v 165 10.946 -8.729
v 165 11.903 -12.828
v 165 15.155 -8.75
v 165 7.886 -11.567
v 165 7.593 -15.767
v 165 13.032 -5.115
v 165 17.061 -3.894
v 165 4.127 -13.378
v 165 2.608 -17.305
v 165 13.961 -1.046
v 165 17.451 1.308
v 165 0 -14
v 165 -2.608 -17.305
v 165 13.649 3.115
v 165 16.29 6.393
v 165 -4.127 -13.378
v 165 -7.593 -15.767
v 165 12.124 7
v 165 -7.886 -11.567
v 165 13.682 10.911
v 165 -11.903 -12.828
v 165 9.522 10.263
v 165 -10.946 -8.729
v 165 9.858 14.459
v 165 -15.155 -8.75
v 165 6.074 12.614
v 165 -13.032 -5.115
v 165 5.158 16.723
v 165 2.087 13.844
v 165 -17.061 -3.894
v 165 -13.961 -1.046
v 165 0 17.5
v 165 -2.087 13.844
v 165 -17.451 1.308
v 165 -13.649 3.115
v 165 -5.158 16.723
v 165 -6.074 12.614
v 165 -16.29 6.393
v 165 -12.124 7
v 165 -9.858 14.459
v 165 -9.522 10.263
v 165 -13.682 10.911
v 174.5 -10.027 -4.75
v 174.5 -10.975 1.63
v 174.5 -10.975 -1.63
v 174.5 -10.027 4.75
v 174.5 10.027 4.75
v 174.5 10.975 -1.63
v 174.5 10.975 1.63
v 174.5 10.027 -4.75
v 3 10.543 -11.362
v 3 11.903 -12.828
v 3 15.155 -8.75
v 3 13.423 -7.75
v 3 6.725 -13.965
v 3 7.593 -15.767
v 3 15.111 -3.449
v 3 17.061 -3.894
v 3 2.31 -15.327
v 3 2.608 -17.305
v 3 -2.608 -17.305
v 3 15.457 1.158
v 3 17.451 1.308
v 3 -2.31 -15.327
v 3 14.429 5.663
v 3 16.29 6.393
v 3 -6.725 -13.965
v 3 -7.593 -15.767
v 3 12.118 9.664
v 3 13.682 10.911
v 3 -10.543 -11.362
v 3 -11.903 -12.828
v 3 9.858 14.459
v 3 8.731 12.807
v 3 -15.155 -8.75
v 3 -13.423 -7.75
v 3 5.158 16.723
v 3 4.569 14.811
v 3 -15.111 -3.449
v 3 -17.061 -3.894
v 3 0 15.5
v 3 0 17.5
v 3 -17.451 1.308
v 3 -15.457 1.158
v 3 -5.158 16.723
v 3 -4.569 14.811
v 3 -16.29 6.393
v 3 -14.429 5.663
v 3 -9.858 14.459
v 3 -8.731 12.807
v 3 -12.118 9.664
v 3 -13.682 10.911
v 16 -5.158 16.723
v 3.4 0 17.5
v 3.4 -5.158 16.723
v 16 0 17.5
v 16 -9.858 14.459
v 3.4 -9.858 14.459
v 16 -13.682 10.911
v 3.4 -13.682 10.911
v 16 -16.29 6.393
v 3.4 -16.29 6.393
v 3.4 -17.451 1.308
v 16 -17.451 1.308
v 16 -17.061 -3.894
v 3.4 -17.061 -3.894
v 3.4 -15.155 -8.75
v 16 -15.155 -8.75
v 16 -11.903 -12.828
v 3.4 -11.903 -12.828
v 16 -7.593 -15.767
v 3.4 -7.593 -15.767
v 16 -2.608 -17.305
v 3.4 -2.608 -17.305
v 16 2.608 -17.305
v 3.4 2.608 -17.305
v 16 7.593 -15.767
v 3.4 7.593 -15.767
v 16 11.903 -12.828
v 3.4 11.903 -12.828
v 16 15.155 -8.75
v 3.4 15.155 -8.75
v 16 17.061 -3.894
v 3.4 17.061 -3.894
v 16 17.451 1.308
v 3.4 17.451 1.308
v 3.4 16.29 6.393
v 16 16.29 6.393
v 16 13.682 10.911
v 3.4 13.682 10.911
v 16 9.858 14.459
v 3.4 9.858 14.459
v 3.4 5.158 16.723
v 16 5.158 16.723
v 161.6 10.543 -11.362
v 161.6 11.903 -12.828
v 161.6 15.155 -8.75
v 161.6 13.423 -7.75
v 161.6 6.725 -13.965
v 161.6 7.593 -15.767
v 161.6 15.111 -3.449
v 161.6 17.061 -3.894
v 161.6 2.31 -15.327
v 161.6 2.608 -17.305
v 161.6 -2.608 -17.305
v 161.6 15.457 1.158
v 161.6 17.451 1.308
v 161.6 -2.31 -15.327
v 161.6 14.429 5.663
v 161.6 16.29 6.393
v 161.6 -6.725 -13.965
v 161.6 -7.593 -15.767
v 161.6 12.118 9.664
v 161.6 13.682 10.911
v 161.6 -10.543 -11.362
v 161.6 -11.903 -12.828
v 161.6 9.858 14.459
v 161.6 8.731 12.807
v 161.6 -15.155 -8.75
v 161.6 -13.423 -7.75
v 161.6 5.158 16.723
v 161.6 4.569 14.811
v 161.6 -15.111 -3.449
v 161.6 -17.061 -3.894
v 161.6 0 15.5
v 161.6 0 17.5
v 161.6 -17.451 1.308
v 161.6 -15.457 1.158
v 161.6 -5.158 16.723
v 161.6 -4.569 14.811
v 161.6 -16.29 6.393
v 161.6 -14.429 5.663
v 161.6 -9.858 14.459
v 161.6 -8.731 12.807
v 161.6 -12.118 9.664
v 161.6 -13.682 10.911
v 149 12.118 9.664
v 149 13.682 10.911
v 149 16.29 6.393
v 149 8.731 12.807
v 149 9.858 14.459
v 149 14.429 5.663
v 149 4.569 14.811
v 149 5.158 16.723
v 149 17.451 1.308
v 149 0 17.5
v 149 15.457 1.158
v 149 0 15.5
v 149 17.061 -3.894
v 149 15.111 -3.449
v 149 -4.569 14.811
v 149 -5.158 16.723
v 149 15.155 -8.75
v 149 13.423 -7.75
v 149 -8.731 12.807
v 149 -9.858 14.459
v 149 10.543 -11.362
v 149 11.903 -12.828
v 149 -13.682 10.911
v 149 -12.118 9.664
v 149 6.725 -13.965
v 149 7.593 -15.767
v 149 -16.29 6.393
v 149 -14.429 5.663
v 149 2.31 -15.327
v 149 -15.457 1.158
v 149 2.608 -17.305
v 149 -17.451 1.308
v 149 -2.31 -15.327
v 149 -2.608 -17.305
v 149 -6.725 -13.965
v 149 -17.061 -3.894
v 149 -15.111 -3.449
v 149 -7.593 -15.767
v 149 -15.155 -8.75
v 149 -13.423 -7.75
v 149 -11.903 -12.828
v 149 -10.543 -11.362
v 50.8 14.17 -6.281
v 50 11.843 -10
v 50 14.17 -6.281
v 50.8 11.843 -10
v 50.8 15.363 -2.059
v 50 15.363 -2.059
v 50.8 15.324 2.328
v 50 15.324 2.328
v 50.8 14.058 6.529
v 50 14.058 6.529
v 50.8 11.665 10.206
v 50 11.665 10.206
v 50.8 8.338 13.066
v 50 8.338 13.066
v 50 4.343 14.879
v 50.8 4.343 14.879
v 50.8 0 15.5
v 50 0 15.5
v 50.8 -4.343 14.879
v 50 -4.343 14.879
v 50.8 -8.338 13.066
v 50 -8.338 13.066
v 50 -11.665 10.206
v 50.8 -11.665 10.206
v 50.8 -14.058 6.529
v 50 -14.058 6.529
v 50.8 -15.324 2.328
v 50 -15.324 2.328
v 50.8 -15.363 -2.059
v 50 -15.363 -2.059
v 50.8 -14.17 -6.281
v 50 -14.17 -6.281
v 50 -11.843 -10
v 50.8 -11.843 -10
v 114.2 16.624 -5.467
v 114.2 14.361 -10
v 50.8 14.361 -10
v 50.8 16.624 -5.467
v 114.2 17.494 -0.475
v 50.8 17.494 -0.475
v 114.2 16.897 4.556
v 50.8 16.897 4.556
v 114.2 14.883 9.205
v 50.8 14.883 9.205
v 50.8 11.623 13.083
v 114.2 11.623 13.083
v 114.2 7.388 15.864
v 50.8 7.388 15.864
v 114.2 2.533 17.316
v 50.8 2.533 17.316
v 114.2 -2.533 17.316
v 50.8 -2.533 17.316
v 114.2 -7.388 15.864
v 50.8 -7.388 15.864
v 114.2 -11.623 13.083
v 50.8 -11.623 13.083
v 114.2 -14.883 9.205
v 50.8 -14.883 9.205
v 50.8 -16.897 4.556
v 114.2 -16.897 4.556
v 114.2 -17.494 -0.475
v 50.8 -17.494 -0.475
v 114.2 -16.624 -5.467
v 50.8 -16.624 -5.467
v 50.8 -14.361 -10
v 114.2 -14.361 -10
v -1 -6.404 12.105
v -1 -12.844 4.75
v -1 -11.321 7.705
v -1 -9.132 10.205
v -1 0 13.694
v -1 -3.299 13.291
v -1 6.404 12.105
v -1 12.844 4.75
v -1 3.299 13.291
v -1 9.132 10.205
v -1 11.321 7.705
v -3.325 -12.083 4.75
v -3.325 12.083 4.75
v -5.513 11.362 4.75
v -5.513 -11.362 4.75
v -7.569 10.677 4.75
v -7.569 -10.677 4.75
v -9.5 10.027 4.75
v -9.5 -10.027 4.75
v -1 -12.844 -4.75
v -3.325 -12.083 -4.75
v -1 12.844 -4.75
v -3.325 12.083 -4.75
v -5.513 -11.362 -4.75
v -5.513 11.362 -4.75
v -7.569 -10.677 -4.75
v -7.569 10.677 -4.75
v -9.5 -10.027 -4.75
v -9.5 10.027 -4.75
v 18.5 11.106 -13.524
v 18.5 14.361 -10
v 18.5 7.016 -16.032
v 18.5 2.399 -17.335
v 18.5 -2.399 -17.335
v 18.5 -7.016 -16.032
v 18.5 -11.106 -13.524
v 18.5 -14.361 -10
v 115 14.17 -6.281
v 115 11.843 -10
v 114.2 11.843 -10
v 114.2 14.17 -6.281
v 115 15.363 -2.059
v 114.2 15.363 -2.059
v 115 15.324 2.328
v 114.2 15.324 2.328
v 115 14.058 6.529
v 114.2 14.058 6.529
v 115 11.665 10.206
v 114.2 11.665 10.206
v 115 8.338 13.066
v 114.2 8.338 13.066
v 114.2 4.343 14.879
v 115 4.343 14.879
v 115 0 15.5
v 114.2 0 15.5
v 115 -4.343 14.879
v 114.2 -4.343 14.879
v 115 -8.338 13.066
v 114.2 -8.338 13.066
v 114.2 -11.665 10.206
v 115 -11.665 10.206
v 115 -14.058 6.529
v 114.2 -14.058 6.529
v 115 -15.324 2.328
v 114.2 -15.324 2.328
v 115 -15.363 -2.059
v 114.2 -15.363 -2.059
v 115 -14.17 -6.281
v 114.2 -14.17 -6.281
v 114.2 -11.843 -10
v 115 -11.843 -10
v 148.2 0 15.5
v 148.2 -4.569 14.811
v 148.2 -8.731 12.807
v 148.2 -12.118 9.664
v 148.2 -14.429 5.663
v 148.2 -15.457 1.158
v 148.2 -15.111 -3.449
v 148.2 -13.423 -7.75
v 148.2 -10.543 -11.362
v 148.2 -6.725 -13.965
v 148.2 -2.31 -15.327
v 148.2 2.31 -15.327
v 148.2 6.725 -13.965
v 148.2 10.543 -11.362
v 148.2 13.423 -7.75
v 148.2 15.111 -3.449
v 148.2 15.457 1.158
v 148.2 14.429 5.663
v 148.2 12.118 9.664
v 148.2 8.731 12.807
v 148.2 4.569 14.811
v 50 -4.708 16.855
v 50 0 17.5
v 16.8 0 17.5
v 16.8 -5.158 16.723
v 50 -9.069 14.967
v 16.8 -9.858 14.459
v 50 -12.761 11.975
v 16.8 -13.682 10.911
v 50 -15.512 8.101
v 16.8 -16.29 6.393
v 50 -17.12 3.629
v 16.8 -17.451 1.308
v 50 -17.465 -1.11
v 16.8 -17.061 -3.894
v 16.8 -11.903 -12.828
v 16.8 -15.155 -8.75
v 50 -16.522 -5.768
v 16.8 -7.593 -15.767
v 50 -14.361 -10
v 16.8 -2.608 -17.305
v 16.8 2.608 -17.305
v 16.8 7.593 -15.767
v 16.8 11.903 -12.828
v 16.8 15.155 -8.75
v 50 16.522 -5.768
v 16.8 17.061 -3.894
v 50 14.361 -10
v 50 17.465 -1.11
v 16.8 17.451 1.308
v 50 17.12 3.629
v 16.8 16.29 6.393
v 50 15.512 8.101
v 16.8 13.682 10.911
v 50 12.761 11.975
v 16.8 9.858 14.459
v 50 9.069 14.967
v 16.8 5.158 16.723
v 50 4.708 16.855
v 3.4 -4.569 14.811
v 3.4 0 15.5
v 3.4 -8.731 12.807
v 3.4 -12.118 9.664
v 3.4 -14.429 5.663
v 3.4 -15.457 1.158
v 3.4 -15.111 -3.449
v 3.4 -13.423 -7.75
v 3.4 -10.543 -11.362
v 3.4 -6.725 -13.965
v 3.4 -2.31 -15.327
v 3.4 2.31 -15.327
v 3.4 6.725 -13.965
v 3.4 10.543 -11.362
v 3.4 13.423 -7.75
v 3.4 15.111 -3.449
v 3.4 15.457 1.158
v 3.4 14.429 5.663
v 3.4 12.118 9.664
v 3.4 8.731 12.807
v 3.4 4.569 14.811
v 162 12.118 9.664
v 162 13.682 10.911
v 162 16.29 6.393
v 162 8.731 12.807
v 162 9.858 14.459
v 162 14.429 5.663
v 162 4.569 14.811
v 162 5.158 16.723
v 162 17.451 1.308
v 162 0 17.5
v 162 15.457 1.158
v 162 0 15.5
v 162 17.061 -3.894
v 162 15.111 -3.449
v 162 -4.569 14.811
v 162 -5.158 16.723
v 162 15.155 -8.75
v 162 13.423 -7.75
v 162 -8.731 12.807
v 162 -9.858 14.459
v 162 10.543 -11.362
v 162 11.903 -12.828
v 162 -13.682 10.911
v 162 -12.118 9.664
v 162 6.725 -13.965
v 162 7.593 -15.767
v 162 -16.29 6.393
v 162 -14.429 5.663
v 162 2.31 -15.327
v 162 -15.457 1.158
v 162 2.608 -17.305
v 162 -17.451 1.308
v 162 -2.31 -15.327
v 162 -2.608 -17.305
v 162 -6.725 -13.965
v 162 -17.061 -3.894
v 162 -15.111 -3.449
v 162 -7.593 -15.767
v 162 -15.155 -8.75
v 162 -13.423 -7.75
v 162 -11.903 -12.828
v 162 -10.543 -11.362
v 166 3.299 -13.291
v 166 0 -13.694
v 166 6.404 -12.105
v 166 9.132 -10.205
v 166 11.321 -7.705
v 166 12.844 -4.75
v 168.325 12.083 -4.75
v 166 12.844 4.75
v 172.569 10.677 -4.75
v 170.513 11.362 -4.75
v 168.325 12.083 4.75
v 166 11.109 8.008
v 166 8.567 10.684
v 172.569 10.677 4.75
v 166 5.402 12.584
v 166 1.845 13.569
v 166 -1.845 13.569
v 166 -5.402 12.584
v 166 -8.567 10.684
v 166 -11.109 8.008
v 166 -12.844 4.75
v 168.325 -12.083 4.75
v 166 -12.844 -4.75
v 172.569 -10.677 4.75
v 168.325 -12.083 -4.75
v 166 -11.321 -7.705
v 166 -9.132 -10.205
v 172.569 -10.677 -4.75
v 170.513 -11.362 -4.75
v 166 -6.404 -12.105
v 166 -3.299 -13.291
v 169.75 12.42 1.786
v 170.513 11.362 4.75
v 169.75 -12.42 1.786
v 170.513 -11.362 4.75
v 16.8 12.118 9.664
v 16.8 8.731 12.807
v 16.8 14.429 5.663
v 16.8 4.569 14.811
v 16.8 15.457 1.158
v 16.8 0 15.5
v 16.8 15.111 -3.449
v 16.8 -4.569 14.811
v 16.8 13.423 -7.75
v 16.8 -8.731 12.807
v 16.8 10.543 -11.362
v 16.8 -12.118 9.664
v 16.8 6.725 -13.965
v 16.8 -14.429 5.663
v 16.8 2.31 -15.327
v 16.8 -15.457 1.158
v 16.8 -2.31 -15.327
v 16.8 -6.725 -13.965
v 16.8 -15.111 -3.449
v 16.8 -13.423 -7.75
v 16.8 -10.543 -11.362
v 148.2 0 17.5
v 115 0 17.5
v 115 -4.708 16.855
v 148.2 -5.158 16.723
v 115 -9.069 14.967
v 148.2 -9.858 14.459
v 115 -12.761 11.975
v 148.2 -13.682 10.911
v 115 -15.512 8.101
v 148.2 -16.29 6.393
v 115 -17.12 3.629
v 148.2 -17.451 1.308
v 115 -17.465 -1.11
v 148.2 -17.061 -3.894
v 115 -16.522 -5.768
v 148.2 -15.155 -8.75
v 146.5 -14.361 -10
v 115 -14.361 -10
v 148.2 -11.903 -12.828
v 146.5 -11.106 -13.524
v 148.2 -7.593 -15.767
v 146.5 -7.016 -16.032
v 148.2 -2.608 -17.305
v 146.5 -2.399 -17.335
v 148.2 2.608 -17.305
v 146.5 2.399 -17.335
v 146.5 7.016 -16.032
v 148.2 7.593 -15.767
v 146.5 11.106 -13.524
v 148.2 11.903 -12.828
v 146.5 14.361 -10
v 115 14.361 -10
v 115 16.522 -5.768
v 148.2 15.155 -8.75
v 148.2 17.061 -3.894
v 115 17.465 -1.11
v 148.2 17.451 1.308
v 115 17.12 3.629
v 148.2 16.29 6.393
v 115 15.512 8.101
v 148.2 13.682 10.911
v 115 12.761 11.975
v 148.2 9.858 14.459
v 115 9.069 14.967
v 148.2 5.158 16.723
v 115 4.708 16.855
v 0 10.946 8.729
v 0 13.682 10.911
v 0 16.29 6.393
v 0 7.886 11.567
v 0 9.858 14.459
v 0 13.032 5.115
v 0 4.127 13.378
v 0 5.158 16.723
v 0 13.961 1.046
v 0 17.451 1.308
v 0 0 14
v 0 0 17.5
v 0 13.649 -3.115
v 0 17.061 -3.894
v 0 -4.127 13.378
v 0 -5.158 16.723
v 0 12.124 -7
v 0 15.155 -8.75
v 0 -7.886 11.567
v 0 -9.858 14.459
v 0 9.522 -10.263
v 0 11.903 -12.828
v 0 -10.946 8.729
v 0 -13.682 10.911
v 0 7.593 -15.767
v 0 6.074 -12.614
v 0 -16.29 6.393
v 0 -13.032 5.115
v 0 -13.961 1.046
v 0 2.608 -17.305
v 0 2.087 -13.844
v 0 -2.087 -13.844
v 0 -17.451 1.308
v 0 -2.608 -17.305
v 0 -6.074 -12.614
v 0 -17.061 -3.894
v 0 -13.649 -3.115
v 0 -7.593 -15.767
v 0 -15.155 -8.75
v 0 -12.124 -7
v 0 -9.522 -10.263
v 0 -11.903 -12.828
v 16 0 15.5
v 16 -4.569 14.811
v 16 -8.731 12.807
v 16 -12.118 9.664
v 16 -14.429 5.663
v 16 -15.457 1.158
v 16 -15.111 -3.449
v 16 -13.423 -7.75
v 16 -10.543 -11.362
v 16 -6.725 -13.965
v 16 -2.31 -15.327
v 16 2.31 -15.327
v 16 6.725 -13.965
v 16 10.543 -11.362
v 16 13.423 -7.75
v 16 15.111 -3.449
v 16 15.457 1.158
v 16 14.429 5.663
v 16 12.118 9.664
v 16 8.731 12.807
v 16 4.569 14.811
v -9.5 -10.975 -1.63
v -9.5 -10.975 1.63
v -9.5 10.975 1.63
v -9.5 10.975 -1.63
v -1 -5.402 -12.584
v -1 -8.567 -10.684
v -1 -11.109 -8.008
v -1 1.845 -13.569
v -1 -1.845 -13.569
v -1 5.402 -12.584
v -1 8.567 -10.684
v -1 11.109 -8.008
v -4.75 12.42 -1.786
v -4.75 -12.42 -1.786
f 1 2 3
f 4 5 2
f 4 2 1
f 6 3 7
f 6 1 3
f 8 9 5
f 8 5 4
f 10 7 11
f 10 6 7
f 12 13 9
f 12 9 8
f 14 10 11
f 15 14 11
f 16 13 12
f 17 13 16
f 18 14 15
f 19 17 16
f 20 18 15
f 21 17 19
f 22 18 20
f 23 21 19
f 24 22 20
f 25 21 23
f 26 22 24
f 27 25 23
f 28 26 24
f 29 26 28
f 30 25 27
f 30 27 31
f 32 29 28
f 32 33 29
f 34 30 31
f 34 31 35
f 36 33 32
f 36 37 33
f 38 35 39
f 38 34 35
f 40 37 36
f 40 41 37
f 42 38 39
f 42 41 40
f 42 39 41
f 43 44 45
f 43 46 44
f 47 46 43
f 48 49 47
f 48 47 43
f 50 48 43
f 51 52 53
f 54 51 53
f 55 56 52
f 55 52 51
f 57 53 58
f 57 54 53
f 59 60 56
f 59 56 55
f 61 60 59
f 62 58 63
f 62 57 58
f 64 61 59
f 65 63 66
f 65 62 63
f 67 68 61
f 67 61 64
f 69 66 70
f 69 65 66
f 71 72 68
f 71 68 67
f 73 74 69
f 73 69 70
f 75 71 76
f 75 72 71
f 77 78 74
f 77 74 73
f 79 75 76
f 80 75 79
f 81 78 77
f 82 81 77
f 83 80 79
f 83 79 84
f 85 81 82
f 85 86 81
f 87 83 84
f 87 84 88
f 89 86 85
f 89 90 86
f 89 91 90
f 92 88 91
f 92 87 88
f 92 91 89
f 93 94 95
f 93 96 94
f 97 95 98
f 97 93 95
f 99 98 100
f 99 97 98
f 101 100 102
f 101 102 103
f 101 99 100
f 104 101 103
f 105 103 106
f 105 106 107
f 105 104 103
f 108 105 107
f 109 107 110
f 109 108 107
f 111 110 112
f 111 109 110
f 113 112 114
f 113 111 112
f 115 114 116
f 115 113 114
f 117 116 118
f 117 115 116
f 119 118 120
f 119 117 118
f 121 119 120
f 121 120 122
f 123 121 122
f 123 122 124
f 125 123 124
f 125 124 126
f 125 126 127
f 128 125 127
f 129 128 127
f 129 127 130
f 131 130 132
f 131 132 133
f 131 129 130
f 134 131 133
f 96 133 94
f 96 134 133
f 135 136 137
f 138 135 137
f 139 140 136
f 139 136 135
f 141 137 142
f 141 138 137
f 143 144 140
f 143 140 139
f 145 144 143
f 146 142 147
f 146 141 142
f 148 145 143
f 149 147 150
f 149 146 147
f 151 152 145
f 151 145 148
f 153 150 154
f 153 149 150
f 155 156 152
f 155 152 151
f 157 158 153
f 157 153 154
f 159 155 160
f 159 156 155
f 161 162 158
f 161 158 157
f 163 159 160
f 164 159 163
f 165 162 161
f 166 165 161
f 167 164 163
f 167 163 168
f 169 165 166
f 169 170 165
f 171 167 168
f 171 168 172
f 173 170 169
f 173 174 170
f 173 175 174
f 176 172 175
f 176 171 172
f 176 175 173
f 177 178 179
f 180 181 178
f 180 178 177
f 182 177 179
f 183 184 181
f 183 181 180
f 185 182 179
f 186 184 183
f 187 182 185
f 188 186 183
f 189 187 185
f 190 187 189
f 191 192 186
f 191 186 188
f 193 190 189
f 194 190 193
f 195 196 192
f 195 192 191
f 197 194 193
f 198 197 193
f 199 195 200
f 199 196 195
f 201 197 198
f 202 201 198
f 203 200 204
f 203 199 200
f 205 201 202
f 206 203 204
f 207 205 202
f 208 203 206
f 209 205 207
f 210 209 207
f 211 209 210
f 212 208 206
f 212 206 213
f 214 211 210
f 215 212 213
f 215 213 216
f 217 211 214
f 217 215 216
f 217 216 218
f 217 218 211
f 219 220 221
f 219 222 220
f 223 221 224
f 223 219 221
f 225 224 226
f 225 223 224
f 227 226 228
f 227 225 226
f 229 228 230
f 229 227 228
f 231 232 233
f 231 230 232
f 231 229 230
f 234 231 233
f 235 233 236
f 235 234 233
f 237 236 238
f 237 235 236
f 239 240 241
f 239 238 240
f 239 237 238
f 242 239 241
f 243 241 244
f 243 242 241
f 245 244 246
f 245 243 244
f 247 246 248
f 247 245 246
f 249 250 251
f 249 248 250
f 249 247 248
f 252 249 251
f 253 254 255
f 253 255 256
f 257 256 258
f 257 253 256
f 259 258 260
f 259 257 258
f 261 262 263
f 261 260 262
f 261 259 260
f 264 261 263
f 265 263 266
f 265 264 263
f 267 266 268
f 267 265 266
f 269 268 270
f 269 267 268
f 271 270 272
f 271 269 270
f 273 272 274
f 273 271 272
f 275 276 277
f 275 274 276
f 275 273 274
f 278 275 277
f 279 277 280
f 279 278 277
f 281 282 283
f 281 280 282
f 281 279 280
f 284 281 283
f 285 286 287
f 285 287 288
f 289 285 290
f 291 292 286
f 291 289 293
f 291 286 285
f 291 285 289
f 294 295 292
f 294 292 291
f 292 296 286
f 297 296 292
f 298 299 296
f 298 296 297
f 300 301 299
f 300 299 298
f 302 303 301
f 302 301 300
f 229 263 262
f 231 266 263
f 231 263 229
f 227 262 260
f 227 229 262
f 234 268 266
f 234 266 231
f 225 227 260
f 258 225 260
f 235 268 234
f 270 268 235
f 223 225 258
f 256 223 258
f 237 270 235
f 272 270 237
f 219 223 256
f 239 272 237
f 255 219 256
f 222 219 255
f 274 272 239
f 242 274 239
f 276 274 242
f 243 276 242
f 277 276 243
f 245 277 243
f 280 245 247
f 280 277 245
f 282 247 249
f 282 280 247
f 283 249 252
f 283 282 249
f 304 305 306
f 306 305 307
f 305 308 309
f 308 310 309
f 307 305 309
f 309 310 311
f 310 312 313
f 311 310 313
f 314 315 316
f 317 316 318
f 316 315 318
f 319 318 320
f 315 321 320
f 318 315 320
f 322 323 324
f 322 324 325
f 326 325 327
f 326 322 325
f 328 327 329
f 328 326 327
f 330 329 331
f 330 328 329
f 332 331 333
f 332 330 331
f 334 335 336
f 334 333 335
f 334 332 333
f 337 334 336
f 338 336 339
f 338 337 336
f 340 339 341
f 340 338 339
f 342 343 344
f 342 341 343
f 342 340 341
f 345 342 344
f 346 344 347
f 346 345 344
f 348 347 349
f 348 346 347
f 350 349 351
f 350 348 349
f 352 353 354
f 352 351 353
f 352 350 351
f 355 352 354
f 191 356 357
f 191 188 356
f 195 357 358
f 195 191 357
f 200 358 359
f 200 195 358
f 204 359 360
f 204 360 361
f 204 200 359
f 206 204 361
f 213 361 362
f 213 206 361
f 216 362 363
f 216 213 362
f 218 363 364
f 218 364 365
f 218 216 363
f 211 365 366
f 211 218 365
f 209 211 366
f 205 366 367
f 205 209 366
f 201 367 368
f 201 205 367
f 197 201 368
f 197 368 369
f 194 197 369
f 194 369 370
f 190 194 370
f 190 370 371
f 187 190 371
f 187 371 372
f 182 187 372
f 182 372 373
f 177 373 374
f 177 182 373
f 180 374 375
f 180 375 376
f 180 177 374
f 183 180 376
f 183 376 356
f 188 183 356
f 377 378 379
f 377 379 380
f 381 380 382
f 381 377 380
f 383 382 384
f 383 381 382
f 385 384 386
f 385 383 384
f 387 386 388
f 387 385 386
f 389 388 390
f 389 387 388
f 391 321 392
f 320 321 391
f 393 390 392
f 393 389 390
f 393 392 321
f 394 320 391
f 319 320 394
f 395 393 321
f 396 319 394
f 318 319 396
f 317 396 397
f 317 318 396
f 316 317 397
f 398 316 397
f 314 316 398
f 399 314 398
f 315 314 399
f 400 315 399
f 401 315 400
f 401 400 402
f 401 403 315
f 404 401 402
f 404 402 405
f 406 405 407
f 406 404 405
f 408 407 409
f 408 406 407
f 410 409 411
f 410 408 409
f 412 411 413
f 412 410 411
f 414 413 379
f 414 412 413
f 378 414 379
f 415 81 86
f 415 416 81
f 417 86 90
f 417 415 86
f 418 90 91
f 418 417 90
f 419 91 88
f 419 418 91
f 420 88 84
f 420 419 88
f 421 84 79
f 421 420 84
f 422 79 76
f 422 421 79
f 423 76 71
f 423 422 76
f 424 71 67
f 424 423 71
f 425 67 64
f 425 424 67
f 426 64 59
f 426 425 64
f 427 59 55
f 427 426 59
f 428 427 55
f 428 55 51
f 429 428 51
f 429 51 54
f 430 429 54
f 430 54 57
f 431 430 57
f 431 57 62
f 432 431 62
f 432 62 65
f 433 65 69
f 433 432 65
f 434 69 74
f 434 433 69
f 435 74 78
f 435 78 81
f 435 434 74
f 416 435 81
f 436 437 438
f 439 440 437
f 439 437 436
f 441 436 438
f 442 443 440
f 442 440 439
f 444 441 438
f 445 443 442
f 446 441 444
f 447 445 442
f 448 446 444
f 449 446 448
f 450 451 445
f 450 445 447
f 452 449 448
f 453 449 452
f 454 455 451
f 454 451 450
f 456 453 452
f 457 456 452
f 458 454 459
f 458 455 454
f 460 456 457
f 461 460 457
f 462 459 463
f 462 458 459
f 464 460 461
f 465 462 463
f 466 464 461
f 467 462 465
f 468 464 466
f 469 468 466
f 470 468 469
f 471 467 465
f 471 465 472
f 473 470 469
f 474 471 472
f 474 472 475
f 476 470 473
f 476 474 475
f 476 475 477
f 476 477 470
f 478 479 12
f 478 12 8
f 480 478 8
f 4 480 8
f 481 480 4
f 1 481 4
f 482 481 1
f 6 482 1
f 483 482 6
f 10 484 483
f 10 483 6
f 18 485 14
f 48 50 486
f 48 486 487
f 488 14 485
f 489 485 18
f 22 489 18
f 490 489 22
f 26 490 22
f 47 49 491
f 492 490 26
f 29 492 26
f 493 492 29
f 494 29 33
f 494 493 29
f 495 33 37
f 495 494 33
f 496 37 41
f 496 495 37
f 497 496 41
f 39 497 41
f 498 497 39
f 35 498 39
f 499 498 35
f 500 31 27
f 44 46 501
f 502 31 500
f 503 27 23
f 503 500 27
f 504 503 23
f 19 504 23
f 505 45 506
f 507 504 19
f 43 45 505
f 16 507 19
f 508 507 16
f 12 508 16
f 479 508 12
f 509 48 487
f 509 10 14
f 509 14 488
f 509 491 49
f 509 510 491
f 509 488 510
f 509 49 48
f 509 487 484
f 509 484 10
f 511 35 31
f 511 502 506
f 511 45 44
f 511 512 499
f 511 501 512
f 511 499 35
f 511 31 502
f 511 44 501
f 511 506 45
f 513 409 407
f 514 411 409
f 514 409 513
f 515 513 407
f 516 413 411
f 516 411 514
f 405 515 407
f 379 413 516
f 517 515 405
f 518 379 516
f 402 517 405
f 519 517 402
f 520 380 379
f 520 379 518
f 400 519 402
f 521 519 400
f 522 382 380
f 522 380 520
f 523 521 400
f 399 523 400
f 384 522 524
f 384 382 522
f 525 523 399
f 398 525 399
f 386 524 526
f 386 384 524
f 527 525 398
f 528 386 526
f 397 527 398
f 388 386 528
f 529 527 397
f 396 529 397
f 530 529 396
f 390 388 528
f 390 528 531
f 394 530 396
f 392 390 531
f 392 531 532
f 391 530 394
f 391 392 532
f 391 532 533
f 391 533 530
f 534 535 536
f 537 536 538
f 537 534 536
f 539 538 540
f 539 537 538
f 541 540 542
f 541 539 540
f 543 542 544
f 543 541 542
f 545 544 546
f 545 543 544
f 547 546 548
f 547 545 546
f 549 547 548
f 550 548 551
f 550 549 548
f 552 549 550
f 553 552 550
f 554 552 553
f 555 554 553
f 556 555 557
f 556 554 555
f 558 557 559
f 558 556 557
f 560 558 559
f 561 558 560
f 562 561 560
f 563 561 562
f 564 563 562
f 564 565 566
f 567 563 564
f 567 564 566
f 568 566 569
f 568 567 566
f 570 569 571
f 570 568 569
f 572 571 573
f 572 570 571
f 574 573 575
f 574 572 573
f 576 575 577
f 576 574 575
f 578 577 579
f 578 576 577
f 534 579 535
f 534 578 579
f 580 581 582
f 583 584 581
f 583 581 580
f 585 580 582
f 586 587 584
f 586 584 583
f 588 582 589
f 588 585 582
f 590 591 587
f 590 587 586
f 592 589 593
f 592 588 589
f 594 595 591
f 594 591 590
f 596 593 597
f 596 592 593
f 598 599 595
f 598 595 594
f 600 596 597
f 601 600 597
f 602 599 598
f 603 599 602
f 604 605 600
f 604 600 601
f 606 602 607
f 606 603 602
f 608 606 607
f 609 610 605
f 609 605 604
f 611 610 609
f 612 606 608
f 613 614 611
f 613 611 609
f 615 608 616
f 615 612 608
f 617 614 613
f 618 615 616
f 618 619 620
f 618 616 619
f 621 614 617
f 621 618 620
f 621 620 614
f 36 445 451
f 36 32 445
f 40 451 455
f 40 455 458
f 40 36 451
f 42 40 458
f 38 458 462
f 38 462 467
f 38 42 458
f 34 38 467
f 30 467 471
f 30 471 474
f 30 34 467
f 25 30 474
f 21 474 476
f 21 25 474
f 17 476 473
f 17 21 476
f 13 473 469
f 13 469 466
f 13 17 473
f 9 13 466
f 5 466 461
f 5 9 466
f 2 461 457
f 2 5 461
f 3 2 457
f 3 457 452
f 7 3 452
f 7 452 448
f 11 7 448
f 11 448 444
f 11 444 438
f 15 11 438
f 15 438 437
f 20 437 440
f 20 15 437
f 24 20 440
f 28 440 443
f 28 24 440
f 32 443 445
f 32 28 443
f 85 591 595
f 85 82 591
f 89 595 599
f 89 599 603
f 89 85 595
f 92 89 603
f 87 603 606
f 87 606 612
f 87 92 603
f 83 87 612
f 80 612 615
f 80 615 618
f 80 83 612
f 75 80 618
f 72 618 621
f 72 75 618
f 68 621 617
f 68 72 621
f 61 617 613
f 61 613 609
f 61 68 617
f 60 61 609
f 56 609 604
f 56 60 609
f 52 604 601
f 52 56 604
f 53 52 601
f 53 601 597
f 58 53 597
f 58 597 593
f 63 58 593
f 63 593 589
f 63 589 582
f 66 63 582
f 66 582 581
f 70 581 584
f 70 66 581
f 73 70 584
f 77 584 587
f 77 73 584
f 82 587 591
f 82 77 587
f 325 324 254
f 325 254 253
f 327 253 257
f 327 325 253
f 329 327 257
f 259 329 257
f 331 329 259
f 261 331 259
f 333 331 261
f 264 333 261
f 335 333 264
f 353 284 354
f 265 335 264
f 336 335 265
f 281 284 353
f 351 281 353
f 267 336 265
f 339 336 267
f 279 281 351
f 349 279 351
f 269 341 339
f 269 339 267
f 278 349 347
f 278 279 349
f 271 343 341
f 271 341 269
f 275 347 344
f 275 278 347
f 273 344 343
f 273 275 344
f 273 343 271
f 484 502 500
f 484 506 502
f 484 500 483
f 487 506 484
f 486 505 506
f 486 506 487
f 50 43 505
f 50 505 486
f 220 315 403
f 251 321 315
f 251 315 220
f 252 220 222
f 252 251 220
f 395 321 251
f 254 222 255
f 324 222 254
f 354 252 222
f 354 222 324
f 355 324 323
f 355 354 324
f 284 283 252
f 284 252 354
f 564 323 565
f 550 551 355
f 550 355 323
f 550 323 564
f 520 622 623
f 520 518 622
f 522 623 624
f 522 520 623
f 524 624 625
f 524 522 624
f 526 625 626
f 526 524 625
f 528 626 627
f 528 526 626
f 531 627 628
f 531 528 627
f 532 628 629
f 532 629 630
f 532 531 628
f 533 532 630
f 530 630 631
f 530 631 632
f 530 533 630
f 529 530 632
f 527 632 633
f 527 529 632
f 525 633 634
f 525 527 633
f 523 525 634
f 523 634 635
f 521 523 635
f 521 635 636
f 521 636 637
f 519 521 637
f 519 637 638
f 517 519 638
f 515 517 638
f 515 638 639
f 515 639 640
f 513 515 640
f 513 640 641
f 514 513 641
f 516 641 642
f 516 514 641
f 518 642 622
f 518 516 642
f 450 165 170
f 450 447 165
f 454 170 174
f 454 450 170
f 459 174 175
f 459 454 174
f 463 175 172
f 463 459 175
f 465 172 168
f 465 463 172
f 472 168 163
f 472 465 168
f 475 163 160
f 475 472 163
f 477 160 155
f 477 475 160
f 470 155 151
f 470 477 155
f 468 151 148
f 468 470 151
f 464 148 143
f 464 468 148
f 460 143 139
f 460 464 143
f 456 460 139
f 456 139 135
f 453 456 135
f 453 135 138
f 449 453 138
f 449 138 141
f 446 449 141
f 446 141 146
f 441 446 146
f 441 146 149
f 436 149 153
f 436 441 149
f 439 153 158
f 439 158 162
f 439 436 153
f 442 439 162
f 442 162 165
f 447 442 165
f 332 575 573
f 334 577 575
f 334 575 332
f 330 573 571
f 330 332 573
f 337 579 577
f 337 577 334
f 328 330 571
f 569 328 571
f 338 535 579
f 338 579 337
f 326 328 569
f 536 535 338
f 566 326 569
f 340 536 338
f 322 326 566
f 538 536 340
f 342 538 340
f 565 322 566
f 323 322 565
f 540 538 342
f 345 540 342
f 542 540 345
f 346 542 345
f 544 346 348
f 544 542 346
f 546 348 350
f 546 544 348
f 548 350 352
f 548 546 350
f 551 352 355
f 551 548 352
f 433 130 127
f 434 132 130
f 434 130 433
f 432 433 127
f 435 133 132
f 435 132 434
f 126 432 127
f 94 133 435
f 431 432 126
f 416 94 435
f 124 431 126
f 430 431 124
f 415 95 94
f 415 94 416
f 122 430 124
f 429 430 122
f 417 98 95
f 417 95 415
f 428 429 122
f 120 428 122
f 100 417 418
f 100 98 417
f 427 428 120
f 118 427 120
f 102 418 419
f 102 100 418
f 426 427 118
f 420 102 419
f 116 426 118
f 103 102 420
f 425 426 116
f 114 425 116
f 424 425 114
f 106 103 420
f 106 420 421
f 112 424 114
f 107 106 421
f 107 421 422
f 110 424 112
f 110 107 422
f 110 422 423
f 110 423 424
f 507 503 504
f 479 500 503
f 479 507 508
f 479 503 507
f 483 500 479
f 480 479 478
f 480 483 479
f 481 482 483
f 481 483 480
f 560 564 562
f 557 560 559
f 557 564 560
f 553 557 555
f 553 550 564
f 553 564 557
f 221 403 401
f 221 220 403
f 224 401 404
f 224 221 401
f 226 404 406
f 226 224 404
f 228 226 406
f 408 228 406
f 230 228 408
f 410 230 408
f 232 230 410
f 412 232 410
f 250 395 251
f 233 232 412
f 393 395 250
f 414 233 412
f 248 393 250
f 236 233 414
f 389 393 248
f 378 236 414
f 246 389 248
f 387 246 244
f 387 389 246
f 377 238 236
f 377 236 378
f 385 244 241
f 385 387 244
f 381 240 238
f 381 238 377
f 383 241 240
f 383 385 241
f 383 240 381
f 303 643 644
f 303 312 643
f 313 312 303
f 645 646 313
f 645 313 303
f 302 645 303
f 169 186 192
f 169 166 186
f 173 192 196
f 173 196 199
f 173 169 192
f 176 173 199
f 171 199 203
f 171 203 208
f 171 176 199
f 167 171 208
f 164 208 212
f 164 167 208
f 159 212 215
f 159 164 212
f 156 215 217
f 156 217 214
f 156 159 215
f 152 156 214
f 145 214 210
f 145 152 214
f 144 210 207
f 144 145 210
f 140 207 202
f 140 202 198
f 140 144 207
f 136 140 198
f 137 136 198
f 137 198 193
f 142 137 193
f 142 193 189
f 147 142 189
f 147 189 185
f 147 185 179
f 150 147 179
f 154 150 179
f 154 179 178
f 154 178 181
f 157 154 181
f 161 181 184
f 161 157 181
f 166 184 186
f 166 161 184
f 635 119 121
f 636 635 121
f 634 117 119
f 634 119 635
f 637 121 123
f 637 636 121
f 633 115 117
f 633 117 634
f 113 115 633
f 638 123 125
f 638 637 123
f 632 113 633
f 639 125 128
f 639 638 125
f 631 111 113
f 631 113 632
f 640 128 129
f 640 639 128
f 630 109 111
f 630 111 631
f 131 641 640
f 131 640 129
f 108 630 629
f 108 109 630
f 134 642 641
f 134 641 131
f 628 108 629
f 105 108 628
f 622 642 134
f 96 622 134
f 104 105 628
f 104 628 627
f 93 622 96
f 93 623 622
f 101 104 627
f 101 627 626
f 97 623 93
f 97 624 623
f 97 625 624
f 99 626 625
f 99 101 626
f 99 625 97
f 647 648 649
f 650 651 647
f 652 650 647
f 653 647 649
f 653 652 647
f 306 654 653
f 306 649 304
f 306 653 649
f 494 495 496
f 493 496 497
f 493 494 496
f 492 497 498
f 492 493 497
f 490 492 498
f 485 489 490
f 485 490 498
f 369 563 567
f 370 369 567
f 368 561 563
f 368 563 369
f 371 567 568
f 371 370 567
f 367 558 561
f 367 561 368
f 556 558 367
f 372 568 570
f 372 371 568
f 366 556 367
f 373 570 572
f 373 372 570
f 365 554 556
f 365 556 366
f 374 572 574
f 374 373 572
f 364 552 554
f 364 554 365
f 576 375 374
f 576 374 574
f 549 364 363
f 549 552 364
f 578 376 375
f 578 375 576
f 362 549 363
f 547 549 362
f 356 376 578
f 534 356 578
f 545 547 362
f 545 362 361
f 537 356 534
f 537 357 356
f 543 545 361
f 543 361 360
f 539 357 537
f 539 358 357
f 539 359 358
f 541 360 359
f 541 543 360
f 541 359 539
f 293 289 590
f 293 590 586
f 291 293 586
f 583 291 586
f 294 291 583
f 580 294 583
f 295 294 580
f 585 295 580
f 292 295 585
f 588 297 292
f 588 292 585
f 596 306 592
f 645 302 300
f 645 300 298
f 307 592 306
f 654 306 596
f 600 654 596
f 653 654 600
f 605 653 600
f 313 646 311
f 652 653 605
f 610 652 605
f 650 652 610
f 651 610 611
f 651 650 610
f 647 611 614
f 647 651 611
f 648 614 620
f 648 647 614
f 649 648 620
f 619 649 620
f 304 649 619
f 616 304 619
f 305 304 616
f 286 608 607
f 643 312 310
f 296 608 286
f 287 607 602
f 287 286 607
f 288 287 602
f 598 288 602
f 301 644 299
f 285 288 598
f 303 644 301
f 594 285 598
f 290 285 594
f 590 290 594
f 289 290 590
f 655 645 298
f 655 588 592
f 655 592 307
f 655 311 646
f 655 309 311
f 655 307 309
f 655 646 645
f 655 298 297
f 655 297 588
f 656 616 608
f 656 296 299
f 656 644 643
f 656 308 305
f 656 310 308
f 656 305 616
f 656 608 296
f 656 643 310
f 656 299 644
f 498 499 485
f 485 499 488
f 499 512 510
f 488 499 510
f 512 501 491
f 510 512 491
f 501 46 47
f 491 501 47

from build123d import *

# Parameters (mm, degrees)
CUT_EXTRUDE_1_DEPTH      = 167.845737135
CUT_EXTRUDE_1_DEPTH_BACK = 167.845737135
SKETCH_2_W               = 128
SKETCH_2_H               = 19.899130277
SKETCH_3_R               = 14
EXTRUDE_1_DEPTH          = 9.5
EXTRUDE_1_TAPER          = 17
SKETCH_4_W               = 17.504538799
SKETCH_4_H               = 43.451593783
CUT_EXTRUDE_2_DEPTH      = 8.5
SKETCH_5_R               = 14
EXTRUDE_2_DEPTH          = 9.5
EXTRUDE_2_TAPER          = 17
SKETCH_6_W               = 11.469588706
SKETCH_6_H               = 34.444631615
CUT_EXTRUDE_3_DEPTH      = 8.5


with BuildPart() as part:
    # Эскиз1 → Повернуть1 (revolve)
    with BuildSketch(Plane(origin=(0, 0, 0), x_dir=(1, 0, 0), z_dir=(0, 1, 0))):
        Polygon((0, 0), (0, 17.5), (3, 17.5), (3, 15.5), (3.4, 15.5), (3.4, 17.5), (16, 17.5), (16, 15.5), (16.8, 15.5), (16.8, 17.5), (50, 17.5), (50, 15.5), (50.8, 15.5), (50.8, 17.5), (114.2, 17.5), (114.2, 15.5), (115, 15.5), (115, 17.5), (148.2, 17.5), (148.2, 15.5), (149, 15.5), (149, 17.5), (161.6, 17.5), (161.6, 15.5), (162, 15.5), (162, 17.5), (165, 17.5), (165, 0), align=None)
    revolve(axis=Axis((0, 0, 0), (1, 0, 0)))

    # Эскиз2 → Вырез-Вытянуть1 (cut, two sides: drawn at the far end of the back side and taken through both)
    with BuildSketch(Plane(origin=(0, 0, 0), x_dir=(1, 0, 0), z_dir=(0, 1, 0)).offset(-CUT_EXTRUDE_1_DEPTH_BACK)):
        with Locations((82.5, 19.949565138)):
            Rectangle(SKETCH_2_W, SKETCH_2_H)
    extrude(amount=CUT_EXTRUDE_1_DEPTH + CUT_EXTRUDE_1_DEPTH_BACK, mode=Mode.SUBTRACT)

    # Эскиз3 → Бобышка-Вытянуть1 (add)
    with BuildSketch(Plane.ZY):
        Circle(SKETCH_3_R)
    extrude(amount=EXTRUDE_1_DEPTH, taper=EXTRUDE_1_TAPER)

    # Эскиз4 → Вырез-Вытянуть2 (cut)
    with BuildSketch(Plane.ZY.offset(9.5)):
        with Locations((-13.5022694, 0.56408101)):
            Rectangle(SKETCH_4_W, SKETCH_4_H)
        with Locations((13.5022694, 0.56408101)):
            Rectangle(SKETCH_4_W, SKETCH_4_H)
    extrude(amount=-CUT_EXTRUDE_2_DEPTH, mode=Mode.SUBTRACT)

    # Эскиз5 → Бобышка-Вытянуть2 (add)
    with BuildSketch(Plane(origin=(165, 0, 0), x_dir=(0, 0, -1), z_dir=(1, 0, 0))):
        Circle(SKETCH_5_R)
    extrude(amount=EXTRUDE_2_DEPTH, taper=EXTRUDE_2_TAPER)

    # Эскиз6 → Вырез-Вытянуть3 (cut)
    with BuildSketch(Plane(origin=(174.5, 0, 0), x_dir=(0, 0, -1), z_dir=(1, 0, 0))):
        with Locations((10.484794353, 0.773198928)):
            Rectangle(SKETCH_6_W, SKETCH_6_H)
        with Locations((-10.484794353, 0.773198928)):
            Rectangle(SKETCH_6_W, SKETCH_6_H)
    extrude(amount=-CUT_EXTRUDE_3_DEPTH, mode=Mode.SUBTRACT)


solid = part.part
